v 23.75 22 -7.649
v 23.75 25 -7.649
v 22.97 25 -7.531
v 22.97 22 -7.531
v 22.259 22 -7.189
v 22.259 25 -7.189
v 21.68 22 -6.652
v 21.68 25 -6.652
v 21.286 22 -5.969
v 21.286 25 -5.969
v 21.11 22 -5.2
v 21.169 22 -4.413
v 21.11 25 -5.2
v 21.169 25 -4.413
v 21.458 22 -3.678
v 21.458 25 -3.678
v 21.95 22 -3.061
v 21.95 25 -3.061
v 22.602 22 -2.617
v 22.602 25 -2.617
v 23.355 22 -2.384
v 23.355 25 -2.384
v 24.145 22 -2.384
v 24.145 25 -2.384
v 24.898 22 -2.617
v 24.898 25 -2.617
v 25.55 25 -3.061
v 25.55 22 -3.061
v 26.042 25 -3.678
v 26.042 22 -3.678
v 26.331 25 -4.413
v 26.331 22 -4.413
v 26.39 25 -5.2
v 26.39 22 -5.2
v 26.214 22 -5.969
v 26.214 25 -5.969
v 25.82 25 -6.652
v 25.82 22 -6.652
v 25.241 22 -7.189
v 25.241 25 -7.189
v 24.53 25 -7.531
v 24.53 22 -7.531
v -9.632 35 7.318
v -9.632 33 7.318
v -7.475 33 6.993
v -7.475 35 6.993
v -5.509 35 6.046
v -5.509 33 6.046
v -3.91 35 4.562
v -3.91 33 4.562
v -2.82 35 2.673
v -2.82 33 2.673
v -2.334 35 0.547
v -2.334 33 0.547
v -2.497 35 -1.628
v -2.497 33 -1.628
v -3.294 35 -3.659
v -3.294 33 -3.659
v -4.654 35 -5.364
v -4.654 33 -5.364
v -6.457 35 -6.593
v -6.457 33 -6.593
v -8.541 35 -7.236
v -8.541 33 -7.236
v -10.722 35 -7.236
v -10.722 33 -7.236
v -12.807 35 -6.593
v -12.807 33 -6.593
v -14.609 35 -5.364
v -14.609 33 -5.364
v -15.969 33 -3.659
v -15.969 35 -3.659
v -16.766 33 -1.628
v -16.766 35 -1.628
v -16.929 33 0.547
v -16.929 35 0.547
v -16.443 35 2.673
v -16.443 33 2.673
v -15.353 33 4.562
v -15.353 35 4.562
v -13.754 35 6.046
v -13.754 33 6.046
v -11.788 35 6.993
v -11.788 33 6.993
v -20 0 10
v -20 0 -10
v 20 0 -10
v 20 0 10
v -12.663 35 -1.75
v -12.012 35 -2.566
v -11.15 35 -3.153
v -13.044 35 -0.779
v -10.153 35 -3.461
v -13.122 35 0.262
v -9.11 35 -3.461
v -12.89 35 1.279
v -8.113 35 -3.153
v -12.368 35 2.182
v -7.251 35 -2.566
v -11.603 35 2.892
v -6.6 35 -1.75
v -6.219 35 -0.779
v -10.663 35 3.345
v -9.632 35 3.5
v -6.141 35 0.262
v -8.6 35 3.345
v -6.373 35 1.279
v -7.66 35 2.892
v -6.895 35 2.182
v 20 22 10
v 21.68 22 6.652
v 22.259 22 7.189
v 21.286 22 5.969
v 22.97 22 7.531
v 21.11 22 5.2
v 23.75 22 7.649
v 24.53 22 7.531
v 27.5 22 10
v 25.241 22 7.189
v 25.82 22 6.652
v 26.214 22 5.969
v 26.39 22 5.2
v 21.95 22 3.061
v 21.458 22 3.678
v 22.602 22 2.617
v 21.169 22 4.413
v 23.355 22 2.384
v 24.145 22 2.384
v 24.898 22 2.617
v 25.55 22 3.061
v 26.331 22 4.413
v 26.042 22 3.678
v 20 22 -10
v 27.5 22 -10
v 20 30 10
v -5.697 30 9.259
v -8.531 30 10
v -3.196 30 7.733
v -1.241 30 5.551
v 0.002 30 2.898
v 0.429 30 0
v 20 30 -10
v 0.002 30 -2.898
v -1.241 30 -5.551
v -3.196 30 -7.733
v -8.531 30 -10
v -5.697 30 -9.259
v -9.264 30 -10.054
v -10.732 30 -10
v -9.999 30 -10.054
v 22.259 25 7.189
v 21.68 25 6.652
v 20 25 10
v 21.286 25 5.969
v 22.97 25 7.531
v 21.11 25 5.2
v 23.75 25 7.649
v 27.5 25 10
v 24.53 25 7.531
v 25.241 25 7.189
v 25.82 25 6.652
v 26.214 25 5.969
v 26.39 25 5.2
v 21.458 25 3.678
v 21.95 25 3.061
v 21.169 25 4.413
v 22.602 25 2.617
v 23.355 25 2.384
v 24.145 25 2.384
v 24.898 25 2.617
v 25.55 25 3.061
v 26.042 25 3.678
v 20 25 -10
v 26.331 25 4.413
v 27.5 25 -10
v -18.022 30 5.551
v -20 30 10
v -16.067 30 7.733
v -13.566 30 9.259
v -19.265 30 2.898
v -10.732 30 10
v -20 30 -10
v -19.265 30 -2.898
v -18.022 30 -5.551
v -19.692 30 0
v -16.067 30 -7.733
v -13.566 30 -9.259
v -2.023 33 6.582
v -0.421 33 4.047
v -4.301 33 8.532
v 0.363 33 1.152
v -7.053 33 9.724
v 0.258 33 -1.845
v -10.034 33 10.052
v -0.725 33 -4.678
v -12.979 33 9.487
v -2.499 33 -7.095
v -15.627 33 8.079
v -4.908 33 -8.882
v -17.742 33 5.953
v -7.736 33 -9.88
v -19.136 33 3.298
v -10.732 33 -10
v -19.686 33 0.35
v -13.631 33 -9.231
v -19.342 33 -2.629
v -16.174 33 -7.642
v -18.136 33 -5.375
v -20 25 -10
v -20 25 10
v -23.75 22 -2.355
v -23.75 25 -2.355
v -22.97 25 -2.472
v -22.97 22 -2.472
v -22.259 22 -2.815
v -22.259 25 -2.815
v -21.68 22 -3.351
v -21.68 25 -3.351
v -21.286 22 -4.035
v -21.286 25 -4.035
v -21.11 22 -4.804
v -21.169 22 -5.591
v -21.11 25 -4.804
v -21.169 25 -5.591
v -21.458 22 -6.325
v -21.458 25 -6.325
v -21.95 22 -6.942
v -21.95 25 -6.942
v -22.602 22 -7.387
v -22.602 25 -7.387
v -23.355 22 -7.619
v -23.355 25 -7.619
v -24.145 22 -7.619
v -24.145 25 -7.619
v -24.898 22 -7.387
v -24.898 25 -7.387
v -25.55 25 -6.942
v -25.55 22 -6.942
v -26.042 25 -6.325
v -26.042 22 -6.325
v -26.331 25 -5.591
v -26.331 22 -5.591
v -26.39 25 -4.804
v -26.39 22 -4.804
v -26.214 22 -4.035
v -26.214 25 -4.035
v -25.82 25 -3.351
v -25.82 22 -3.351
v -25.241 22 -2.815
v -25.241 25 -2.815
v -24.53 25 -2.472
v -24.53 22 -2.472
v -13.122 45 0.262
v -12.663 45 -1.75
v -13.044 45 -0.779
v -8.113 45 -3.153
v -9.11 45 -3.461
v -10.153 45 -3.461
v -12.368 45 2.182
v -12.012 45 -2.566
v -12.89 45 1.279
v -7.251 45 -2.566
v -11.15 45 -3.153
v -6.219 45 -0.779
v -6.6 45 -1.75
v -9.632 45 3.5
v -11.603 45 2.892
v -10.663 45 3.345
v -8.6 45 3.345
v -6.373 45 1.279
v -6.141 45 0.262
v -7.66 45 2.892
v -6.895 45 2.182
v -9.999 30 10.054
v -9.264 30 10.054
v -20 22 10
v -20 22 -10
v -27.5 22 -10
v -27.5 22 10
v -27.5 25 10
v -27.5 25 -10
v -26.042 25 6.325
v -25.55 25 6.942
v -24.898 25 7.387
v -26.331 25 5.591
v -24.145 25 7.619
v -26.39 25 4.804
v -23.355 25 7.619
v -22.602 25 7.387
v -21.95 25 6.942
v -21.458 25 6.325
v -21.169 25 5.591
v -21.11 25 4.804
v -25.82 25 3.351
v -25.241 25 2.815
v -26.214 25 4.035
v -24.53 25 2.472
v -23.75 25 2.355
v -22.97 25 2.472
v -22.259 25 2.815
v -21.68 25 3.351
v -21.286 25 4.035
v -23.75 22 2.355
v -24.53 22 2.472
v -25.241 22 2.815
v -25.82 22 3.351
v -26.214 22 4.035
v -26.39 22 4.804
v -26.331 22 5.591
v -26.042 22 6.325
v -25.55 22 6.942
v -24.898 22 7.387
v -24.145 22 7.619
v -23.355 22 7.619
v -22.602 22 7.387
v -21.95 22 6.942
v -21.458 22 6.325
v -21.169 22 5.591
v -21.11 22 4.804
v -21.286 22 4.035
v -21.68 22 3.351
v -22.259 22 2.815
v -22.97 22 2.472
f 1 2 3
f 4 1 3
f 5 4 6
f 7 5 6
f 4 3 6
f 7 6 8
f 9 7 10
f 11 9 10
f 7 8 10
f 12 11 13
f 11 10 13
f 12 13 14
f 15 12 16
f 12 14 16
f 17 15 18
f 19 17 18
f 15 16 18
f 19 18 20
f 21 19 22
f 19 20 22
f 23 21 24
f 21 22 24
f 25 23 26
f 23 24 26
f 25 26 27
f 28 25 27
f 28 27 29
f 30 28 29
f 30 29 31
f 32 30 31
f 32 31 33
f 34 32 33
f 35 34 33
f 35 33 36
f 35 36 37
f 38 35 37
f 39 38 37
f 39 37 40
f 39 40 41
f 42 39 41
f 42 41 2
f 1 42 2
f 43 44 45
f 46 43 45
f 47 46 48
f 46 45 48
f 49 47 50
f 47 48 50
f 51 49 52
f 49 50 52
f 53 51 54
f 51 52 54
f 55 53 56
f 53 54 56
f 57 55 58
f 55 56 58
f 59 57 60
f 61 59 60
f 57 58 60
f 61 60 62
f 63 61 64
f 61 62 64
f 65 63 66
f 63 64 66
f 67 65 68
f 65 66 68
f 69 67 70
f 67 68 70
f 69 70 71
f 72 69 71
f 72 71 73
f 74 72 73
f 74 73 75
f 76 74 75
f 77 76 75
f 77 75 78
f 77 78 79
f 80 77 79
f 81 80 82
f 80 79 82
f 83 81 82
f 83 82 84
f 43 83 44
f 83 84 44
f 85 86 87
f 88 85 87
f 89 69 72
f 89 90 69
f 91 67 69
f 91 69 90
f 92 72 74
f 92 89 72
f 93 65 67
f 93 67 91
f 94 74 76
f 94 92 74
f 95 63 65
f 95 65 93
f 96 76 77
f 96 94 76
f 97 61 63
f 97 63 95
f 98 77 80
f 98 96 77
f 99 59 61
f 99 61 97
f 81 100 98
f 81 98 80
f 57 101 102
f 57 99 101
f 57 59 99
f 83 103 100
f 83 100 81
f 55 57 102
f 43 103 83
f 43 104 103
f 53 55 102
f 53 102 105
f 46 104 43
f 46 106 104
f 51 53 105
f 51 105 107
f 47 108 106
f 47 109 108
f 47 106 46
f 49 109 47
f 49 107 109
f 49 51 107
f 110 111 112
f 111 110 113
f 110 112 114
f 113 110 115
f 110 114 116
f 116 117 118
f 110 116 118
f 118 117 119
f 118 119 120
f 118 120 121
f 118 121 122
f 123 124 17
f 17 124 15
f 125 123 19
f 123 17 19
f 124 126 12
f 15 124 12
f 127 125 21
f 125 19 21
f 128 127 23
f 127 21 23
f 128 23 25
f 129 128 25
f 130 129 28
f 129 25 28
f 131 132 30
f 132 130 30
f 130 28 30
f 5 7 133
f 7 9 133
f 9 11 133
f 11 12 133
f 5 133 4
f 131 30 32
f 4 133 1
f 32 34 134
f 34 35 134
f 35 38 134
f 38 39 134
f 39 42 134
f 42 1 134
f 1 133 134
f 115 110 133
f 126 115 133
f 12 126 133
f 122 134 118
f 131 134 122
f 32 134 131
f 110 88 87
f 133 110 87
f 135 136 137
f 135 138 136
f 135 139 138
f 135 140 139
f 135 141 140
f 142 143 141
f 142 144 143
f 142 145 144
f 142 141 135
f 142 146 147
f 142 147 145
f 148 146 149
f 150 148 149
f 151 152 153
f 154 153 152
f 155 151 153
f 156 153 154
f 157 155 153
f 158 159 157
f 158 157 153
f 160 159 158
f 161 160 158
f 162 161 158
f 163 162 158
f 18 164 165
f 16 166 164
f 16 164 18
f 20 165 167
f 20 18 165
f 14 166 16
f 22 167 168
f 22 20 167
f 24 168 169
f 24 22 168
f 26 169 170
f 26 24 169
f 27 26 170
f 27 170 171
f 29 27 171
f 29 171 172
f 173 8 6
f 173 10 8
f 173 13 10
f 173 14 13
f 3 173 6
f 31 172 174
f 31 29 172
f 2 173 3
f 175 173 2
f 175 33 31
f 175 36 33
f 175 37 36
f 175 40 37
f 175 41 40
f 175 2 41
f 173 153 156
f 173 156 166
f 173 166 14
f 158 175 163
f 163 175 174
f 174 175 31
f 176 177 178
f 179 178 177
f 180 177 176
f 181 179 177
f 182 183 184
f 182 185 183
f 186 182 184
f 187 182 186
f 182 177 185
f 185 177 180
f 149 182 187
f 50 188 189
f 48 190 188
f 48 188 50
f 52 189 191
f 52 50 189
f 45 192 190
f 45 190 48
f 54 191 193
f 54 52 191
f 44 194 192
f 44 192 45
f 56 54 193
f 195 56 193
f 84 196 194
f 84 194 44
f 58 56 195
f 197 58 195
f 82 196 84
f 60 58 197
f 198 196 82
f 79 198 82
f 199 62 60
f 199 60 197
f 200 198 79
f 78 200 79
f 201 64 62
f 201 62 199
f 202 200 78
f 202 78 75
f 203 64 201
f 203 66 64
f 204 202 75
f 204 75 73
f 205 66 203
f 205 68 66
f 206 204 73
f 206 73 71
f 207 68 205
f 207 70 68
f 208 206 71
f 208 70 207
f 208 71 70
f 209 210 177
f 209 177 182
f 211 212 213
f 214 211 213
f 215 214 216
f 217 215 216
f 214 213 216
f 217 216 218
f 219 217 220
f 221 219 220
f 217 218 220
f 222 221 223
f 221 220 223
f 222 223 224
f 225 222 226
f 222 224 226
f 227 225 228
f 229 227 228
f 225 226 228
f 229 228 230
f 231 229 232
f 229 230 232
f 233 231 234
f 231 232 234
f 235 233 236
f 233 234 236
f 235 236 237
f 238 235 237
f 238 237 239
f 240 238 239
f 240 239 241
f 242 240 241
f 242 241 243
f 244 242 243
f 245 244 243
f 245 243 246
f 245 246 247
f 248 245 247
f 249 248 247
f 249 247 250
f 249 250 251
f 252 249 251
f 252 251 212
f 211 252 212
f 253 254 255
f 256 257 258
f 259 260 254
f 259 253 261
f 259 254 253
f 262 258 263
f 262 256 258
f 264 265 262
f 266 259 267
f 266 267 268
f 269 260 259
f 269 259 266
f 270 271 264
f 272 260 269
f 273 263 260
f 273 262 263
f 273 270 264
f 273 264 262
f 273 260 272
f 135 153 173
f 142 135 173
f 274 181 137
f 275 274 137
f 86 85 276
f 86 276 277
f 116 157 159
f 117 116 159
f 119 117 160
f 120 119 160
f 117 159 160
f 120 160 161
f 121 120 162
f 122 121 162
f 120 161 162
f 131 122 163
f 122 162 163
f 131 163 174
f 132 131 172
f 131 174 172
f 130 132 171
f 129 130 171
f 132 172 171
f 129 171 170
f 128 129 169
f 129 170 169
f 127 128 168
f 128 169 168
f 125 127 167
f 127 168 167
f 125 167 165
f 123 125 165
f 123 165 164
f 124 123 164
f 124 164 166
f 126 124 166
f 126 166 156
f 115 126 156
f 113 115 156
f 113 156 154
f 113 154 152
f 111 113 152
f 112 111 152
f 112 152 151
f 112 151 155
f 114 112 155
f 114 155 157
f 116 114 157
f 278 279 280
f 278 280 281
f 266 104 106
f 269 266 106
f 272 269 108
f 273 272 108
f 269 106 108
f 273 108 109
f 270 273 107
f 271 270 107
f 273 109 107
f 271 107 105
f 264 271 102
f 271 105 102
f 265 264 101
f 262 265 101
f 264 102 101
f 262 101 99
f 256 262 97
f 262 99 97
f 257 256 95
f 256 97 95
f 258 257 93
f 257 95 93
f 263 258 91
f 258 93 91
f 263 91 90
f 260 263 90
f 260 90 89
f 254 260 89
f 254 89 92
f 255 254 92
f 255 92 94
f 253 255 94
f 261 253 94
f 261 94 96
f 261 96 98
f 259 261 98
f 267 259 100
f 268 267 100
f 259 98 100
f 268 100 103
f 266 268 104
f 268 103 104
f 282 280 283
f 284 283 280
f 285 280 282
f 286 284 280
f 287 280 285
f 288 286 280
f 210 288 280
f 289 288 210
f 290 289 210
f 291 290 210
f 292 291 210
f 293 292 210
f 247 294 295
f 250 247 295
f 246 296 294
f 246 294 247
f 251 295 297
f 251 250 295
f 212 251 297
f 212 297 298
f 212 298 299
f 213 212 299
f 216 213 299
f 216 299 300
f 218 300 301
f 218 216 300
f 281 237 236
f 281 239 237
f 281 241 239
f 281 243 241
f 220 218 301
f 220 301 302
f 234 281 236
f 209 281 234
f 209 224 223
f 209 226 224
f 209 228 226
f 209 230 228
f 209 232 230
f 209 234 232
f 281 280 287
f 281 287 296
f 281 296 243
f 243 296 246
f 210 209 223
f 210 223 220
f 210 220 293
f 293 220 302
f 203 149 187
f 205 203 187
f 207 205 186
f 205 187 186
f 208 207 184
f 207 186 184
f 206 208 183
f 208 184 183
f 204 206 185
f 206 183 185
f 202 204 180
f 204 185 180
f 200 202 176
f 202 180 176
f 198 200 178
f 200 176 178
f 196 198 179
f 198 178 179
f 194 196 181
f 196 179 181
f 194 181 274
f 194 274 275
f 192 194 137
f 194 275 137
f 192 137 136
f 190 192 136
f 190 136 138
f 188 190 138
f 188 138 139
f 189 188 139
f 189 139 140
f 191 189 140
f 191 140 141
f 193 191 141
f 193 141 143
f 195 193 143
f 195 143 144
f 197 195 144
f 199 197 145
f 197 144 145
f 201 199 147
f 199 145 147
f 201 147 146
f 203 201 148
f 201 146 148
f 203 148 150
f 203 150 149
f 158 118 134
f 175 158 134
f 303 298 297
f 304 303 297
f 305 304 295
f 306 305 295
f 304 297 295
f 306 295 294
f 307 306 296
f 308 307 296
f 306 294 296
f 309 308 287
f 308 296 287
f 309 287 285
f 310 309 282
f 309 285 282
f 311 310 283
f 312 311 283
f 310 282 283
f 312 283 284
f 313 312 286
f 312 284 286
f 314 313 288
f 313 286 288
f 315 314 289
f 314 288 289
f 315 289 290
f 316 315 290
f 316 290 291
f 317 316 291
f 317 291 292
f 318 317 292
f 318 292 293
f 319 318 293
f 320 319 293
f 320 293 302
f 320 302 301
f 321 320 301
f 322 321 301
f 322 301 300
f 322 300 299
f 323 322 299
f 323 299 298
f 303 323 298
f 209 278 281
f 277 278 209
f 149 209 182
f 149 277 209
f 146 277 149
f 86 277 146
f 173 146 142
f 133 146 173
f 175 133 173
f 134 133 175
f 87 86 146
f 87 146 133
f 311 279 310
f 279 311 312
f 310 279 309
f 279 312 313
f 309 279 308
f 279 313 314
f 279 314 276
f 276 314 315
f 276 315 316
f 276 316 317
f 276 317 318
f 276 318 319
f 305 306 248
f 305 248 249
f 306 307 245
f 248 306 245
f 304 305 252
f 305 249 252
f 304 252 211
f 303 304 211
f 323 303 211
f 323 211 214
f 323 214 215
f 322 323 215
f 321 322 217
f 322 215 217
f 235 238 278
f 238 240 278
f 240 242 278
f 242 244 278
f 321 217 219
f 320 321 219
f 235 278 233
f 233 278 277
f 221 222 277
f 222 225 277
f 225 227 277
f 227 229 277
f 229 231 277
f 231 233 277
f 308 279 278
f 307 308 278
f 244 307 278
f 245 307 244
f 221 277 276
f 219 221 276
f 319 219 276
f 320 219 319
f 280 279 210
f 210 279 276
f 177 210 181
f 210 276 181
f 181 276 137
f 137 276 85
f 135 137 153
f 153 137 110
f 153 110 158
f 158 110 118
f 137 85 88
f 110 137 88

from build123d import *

# Parameters (mm, degrees)
IZIM1_W                     = 40
IZIM1_H                     = 20
Y_KSEKLIK_EKSTR_ZYON1_DEPTH = 30
IZIM2_W                     = 55
IZIM2_H                     = 20
Y_KSEKLIK_EKSTR_ZYON2_DEPTH = 3
IZIM3_R                     = 2.647008292
KES_EKSTR_ZYON1_DEPTH       = 13
IZIM4_R                     = 10.060368761
Y_KSEKLIK_EKSTR_ZYON3_DEPTH = 3
IZIM5_R                     = 7.317651021
Y_KSEKLIK_EKSTR_ZYON4_DEPTH = 2
IZIM6_R                     = 3.5
Y_KSEKLIK_EKSTR_ZYON5_DEPTH = 10


with BuildPart() as part:
    # Çizim1 → Yükseklik-Ekstrüzyon1 (new body)
    with BuildSketch(Plane(origin=(0, 0, 0), x_dir=(1, 0, 0), z_dir=(0, 1, 0))):
        Rectangle(IZIM1_W, IZIM1_H)
    extrude(amount=Y_KSEKLIK_EKSTR_ZYON1_DEPTH)

    # Çizim2 → Yükseklik-Ekstrüzyon2 (add)
    with BuildSketch(Plane(origin=(0, 22, 0), x_dir=(1, 0, 0), z_dir=(0, 1, 0))):
        Rectangle(IZIM2_W, IZIM2_H)
    extrude(amount=Y_KSEKLIK_EKSTR_ZYON2_DEPTH)

    # Çizim3 → Kes-Ekstrüzyon1 (cut)
    with BuildSketch(Plane(origin=(0, 25, 0), x_dir=(1, 0, 0), z_dir=(0, 1, 0))):
        with Locations(Location((-23.75, 5.00174063, 0), (0, 0, 270))):
            Circle(IZIM3_R)
        with Locations(Location((-23.75, -5.00174063, 0), (0, 0, 90))):
            Circle(IZIM3_R)
        with Locations(Location((23.75, -5.00174063, 0), (0, 0, 270))):
            Circle(IZIM3_R)
        with Locations(Location((23.75, 5.00174063, 0), (0, 0, 90))):
            Circle(IZIM3_R)
    extrude(amount=-KES_EKSTR_ZYON1_DEPTH, mode=Mode.SUBTRACT)

    # Çizim4 → Yükseklik-Ekstrüzyon3 (add)
    with BuildSketch(Plane(origin=(0, 30, 0), x_dir=(1, 0, 0), z_dir=(0, 1, 0))):
        with Locations(Location((-9.631551276, 0, 0), (0, 0, 96.279921615))):
            Circle(IZIM4_R)
    extrude(amount=Y_KSEKLIK_EKSTR_ZYON3_DEPTH)

    # Çizim5 → Yükseklik-Ekstrüzyon4 (add)
    with BuildSketch(Plane(origin=(0, 33, 0), x_dir=(1, 0, 0), z_dir=(0, 1, 0))):
        with Locations(Location((-9.631551276, 0, 0), (0, 0, 270))):
            Circle(IZIM5_R)
    extrude(amount=Y_KSEKLIK_EKSTR_ZYON4_DEPTH)

    # Çizim6 → Yükseklik-Ekstrüzyon5 (add)
    with BuildSketch(Plane(origin=(0, 35, 0), x_dir=(1, 0, 0), z_dir=(0, 1, 0))):
        with Locations(Location((-9.631551276, 0, 0), (0, 0, 270))):
            Circle(IZIM6_R)
    extrude(amount=Y_KSEKLIK_EKSTR_ZYON5_DEPTH)


solid = part.part
